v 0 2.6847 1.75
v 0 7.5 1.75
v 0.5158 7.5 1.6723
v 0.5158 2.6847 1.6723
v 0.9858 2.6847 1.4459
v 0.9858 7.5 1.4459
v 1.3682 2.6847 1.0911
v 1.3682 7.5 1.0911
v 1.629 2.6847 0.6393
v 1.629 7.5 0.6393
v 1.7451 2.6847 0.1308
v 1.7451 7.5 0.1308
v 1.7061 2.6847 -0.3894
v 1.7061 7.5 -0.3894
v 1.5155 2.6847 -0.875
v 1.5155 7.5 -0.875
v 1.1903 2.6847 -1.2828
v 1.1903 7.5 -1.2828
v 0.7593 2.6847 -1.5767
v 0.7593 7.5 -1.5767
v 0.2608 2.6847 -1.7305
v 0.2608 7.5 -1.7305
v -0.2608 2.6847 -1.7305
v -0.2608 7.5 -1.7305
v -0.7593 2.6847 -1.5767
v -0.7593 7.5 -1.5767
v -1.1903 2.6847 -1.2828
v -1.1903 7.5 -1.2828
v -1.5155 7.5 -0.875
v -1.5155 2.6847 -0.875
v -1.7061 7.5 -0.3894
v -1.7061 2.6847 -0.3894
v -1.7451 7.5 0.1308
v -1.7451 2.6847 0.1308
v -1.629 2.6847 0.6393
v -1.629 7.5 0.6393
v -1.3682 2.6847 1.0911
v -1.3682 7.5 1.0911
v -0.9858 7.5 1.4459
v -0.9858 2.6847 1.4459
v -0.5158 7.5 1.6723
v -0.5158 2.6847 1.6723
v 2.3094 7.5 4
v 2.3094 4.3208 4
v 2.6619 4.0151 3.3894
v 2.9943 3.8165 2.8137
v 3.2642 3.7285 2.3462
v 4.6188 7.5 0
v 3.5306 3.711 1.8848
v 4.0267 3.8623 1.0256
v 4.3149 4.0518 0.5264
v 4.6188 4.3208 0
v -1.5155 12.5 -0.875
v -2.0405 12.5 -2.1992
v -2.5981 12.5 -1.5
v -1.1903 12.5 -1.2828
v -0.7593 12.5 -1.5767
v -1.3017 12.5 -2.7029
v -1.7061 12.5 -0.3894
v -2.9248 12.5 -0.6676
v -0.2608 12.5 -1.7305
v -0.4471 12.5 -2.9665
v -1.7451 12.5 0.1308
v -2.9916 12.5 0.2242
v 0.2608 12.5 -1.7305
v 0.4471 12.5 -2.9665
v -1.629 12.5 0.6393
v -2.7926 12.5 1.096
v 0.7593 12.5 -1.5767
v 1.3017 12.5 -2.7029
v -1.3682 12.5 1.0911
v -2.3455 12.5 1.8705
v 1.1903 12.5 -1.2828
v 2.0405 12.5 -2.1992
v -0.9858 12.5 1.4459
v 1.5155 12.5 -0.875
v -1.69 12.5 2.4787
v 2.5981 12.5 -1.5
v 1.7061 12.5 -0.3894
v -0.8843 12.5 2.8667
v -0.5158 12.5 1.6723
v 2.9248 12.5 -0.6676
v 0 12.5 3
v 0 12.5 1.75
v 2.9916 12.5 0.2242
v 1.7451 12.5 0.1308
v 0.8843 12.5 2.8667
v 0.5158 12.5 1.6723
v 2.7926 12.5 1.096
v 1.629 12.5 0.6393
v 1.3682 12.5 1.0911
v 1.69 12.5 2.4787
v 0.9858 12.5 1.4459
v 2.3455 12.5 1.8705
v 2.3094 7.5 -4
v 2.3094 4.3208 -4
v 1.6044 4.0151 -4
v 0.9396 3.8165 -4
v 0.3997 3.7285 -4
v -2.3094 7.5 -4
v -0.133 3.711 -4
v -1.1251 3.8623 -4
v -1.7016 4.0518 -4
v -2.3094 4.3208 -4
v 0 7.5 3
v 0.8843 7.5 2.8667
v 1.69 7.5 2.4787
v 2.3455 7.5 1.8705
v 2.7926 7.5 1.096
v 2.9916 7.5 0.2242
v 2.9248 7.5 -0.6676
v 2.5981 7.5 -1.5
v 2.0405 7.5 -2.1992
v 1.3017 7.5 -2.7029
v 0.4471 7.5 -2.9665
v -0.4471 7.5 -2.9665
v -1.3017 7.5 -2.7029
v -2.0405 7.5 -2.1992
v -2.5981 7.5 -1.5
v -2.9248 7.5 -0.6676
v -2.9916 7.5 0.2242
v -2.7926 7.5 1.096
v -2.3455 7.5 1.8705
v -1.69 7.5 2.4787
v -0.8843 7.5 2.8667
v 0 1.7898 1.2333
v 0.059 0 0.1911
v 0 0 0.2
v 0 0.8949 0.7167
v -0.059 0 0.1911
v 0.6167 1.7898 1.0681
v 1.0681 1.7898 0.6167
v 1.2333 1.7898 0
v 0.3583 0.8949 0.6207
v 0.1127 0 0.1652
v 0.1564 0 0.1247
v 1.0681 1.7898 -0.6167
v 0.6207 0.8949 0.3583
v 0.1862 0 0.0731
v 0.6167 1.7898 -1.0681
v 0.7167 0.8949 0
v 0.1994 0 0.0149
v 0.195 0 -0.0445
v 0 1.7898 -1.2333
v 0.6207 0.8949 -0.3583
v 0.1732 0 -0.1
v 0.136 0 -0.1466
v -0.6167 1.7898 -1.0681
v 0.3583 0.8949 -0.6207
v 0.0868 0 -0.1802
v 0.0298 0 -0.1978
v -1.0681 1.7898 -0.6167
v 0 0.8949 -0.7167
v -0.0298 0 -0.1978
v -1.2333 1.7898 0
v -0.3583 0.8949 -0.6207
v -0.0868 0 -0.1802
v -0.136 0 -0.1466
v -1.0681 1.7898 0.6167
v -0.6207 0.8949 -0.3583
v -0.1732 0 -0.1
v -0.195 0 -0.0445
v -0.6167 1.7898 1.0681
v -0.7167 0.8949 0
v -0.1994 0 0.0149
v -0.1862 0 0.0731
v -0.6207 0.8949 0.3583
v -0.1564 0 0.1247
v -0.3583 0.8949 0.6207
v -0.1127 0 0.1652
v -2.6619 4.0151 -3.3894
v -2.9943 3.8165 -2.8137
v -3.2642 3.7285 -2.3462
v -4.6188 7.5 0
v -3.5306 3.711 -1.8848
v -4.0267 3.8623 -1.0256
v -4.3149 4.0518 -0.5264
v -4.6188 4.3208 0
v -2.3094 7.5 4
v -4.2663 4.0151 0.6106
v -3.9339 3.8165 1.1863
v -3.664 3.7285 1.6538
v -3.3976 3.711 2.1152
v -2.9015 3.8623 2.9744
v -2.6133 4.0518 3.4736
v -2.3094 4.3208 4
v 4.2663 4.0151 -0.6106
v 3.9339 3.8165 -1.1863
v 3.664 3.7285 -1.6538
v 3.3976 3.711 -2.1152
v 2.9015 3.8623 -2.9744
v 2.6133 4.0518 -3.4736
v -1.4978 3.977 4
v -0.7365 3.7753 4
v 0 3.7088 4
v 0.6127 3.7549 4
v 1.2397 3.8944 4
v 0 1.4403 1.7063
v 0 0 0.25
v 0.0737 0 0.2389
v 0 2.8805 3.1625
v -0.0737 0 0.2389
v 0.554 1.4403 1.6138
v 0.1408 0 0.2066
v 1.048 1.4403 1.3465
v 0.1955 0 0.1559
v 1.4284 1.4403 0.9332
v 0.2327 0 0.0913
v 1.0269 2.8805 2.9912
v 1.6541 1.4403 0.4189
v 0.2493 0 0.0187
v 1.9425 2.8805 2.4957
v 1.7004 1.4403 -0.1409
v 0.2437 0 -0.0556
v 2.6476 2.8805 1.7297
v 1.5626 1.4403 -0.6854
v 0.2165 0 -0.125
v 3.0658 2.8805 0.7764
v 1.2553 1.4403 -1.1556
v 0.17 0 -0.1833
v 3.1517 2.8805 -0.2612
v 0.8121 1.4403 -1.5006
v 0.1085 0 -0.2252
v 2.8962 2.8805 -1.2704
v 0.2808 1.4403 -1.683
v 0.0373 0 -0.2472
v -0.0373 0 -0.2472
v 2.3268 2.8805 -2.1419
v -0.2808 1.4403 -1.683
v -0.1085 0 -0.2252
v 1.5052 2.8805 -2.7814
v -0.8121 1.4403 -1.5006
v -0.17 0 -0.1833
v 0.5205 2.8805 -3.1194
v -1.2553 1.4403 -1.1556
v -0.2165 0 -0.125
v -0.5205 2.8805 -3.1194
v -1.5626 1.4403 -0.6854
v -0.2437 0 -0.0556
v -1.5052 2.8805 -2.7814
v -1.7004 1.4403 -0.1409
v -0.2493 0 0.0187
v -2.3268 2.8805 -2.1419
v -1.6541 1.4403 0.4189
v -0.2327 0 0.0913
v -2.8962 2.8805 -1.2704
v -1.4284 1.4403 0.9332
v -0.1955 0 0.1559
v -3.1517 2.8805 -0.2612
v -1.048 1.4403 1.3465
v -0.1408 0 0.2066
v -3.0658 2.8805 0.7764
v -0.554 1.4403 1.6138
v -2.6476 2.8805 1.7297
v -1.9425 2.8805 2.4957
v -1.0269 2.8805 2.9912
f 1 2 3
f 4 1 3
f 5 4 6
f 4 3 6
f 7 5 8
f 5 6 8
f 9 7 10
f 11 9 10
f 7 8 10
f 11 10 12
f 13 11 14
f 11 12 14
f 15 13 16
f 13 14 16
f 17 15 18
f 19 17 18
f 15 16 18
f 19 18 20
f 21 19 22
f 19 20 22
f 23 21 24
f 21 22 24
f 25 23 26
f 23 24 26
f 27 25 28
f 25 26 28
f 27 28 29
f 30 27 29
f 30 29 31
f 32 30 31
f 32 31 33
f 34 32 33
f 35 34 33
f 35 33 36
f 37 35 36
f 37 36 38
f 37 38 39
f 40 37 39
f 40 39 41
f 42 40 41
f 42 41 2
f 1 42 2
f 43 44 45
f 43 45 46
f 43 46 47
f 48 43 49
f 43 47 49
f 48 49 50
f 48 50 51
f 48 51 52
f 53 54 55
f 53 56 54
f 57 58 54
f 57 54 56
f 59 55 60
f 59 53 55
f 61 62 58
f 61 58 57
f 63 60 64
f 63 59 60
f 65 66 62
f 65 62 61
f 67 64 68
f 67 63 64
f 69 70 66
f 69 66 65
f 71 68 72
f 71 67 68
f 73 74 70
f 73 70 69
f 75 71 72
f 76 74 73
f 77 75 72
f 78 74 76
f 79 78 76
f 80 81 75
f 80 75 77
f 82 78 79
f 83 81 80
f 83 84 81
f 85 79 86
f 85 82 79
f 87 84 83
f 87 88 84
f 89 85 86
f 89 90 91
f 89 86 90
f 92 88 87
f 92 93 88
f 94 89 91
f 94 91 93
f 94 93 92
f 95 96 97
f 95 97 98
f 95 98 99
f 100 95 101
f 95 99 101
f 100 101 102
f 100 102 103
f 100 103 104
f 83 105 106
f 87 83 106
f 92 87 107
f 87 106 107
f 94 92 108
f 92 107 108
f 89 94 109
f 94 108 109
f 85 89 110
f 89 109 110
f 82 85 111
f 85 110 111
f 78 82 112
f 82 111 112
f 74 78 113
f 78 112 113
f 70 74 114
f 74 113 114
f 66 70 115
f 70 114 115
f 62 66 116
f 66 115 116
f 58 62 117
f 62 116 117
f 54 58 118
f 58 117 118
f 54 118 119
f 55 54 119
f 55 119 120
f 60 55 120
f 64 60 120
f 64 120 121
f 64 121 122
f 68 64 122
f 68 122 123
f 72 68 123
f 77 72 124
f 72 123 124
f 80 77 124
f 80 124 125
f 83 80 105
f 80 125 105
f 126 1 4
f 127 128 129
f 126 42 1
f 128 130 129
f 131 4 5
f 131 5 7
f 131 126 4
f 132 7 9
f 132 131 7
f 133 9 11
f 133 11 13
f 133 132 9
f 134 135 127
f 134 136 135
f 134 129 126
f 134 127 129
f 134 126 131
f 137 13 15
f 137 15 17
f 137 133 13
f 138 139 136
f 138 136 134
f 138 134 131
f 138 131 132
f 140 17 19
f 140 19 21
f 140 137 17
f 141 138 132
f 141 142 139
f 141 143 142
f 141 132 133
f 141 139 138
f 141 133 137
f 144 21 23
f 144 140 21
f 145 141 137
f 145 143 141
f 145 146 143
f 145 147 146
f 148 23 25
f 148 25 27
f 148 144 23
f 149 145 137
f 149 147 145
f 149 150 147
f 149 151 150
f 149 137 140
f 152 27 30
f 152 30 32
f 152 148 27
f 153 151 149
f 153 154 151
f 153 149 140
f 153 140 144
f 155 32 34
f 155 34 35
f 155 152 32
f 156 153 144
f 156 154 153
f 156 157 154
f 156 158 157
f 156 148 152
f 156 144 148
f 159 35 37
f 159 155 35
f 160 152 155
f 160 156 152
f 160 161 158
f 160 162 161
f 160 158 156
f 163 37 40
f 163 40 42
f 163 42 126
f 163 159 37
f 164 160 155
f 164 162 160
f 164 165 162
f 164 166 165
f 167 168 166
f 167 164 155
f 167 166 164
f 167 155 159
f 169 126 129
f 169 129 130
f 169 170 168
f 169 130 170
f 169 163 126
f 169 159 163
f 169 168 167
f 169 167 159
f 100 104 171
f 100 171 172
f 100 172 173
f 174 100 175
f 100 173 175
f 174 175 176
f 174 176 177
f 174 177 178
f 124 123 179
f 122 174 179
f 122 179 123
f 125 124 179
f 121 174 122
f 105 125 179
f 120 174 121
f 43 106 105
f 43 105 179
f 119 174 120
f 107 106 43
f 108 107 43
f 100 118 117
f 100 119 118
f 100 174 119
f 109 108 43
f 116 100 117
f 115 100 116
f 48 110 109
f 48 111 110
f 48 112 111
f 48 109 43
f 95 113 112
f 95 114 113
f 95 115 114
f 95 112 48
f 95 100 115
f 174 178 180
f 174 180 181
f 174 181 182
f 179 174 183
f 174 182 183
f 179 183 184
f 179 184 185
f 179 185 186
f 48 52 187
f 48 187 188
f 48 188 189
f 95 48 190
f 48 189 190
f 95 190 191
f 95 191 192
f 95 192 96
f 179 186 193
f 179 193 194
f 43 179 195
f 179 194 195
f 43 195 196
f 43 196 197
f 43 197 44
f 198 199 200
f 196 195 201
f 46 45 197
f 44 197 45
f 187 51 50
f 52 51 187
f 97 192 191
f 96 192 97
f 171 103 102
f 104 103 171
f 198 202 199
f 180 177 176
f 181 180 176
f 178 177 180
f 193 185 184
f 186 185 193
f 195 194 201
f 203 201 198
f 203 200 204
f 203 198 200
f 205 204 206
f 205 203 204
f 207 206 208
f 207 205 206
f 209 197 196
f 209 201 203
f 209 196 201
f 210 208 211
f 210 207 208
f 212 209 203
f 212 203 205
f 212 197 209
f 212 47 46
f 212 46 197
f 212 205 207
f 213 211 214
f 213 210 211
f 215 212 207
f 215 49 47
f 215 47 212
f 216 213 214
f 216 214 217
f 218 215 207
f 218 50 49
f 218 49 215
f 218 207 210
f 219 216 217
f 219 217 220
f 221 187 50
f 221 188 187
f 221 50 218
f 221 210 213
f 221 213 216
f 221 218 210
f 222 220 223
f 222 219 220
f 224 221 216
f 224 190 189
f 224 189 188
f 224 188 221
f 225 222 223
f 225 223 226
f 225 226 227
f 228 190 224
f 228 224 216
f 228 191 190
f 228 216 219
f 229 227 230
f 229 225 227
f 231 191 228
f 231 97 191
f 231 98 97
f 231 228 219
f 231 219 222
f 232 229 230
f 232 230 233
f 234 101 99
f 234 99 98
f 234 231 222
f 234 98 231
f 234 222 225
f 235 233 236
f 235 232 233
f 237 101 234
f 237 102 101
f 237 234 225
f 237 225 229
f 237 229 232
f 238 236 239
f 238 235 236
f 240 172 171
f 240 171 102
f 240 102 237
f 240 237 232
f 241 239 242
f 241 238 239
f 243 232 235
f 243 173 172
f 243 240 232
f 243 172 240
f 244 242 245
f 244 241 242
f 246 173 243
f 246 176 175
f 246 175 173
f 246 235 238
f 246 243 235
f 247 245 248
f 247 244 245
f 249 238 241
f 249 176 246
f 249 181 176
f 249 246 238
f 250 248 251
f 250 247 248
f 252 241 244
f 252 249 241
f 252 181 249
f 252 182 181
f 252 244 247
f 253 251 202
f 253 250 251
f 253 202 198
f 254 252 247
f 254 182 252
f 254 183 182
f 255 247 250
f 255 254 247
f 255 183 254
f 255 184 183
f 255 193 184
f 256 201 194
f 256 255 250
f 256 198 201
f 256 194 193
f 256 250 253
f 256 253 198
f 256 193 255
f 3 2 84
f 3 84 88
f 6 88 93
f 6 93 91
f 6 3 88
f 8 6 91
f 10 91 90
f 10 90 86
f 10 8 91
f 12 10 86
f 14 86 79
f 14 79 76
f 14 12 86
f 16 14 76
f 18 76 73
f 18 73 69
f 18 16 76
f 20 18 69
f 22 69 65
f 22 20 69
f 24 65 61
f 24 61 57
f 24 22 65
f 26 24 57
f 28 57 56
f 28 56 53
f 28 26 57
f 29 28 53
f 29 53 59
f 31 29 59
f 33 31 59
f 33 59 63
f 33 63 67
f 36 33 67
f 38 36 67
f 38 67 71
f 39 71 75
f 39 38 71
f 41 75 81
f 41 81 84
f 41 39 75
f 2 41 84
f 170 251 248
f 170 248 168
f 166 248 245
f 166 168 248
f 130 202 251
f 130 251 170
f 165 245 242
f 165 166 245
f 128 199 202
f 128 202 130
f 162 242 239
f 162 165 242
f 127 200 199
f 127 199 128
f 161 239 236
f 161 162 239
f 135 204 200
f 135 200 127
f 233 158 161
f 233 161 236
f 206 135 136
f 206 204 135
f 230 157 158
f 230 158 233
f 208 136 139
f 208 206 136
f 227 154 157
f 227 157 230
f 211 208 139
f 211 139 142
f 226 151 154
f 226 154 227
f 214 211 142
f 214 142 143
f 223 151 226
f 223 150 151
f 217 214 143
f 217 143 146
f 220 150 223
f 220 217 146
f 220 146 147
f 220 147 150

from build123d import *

# Parameters (mm, degrees)
BOSS_EXTRUDE1_DEPTH = 3
SKETCH3_R           = 5.46173703
CUT_EXTRUDE1_DEPTH  = 10
CUT_EXTRUDE2_REACH  = 11.674
SKETCH4_R           = 1.75
SKETCH5_R           = 3
SKETCH5_R_2         = 1.75
BOSS_EXTRUDE2_DEPTH = 5


with BuildPart() as part:
    # Sketch1 → Revolve1 (revolve)
    with BuildSketch(Plane.XY):
        Polygon((-0.2, 0), (-0.25, 0), (-4.8, 4.5), (-1.75, 4.5), (-1.75, 2.684678752), align=None)
    revolve(axis=Axis((0, 0, 0), (0, 1, 0)))

    # Sketch2 → Boss-Extrude1 (add)
    with BuildSketch(Plane(origin=(0, 4.5, 0), x_dir=(1, 0, 0), z_dir=(0, 1, 0))):
        Polygon((2.309401077, -4), (4.618802154, 0), (2.309401077, 4), (-2.309401077, 4), (-4.618802154, 0), (-2.309401077, -4), align=None)
    extrude(amount=BOSS_EXTRUDE1_DEPTH)

    # Sketch3 → Cut-Extrude1 (cut)
    with BuildSketch(Plane(origin=(0, 7.5, 0), x_dir=(1, 0, 0), z_dir=(0, 1, 0))):
        Circle(SKETCH3_R)
        Polygon((-2.309401077, -4), (2.309401077, -4), (4.618802154, 0), (2.309401077, 4), (-2.309401077, 4), (-4.618802154, 0), align=None, mode=Mode.SUBTRACT)
    extrude(amount=-CUT_EXTRUDE1_DEPTH, mode=Mode.SUBTRACT)

    # Sketch4 → Cut-Extrude2 (cut, up to next)
    with BuildSketch(Plane(origin=(0, 7.5, 0), x_dir=(1, 0, 0), z_dir=(0, 1, 0)), mode=Mode.PRIVATE) as cut_extrude2_sk1:
        Circle(SKETCH4_R)
    cut_extrude2_tool1 = extrude(cut_extrude2_sk1.sketch, amount=-CUT_EXTRUDE2_REACH, mode=Mode.PRIVATE) & part.part
    add(cut_extrude2_tool1.solids().sort_by_distance((0, 7.5, 0))[0], mode=Mode.SUBTRACT)

    # Sketch5 → Boss-Extrude2 (add)
    with BuildSketch(Plane(origin=(0, 7.5, 0), x_dir=(1, 0, 0), z_dir=(0, 1, 0))):
        Circle(SKETCH5_R)
        Circle(SKETCH5_R_2, mode=Mode.SUBTRACT)
    extrude(amount=BOSS_EXTRUDE2_DEPTH)


solid = part.part
